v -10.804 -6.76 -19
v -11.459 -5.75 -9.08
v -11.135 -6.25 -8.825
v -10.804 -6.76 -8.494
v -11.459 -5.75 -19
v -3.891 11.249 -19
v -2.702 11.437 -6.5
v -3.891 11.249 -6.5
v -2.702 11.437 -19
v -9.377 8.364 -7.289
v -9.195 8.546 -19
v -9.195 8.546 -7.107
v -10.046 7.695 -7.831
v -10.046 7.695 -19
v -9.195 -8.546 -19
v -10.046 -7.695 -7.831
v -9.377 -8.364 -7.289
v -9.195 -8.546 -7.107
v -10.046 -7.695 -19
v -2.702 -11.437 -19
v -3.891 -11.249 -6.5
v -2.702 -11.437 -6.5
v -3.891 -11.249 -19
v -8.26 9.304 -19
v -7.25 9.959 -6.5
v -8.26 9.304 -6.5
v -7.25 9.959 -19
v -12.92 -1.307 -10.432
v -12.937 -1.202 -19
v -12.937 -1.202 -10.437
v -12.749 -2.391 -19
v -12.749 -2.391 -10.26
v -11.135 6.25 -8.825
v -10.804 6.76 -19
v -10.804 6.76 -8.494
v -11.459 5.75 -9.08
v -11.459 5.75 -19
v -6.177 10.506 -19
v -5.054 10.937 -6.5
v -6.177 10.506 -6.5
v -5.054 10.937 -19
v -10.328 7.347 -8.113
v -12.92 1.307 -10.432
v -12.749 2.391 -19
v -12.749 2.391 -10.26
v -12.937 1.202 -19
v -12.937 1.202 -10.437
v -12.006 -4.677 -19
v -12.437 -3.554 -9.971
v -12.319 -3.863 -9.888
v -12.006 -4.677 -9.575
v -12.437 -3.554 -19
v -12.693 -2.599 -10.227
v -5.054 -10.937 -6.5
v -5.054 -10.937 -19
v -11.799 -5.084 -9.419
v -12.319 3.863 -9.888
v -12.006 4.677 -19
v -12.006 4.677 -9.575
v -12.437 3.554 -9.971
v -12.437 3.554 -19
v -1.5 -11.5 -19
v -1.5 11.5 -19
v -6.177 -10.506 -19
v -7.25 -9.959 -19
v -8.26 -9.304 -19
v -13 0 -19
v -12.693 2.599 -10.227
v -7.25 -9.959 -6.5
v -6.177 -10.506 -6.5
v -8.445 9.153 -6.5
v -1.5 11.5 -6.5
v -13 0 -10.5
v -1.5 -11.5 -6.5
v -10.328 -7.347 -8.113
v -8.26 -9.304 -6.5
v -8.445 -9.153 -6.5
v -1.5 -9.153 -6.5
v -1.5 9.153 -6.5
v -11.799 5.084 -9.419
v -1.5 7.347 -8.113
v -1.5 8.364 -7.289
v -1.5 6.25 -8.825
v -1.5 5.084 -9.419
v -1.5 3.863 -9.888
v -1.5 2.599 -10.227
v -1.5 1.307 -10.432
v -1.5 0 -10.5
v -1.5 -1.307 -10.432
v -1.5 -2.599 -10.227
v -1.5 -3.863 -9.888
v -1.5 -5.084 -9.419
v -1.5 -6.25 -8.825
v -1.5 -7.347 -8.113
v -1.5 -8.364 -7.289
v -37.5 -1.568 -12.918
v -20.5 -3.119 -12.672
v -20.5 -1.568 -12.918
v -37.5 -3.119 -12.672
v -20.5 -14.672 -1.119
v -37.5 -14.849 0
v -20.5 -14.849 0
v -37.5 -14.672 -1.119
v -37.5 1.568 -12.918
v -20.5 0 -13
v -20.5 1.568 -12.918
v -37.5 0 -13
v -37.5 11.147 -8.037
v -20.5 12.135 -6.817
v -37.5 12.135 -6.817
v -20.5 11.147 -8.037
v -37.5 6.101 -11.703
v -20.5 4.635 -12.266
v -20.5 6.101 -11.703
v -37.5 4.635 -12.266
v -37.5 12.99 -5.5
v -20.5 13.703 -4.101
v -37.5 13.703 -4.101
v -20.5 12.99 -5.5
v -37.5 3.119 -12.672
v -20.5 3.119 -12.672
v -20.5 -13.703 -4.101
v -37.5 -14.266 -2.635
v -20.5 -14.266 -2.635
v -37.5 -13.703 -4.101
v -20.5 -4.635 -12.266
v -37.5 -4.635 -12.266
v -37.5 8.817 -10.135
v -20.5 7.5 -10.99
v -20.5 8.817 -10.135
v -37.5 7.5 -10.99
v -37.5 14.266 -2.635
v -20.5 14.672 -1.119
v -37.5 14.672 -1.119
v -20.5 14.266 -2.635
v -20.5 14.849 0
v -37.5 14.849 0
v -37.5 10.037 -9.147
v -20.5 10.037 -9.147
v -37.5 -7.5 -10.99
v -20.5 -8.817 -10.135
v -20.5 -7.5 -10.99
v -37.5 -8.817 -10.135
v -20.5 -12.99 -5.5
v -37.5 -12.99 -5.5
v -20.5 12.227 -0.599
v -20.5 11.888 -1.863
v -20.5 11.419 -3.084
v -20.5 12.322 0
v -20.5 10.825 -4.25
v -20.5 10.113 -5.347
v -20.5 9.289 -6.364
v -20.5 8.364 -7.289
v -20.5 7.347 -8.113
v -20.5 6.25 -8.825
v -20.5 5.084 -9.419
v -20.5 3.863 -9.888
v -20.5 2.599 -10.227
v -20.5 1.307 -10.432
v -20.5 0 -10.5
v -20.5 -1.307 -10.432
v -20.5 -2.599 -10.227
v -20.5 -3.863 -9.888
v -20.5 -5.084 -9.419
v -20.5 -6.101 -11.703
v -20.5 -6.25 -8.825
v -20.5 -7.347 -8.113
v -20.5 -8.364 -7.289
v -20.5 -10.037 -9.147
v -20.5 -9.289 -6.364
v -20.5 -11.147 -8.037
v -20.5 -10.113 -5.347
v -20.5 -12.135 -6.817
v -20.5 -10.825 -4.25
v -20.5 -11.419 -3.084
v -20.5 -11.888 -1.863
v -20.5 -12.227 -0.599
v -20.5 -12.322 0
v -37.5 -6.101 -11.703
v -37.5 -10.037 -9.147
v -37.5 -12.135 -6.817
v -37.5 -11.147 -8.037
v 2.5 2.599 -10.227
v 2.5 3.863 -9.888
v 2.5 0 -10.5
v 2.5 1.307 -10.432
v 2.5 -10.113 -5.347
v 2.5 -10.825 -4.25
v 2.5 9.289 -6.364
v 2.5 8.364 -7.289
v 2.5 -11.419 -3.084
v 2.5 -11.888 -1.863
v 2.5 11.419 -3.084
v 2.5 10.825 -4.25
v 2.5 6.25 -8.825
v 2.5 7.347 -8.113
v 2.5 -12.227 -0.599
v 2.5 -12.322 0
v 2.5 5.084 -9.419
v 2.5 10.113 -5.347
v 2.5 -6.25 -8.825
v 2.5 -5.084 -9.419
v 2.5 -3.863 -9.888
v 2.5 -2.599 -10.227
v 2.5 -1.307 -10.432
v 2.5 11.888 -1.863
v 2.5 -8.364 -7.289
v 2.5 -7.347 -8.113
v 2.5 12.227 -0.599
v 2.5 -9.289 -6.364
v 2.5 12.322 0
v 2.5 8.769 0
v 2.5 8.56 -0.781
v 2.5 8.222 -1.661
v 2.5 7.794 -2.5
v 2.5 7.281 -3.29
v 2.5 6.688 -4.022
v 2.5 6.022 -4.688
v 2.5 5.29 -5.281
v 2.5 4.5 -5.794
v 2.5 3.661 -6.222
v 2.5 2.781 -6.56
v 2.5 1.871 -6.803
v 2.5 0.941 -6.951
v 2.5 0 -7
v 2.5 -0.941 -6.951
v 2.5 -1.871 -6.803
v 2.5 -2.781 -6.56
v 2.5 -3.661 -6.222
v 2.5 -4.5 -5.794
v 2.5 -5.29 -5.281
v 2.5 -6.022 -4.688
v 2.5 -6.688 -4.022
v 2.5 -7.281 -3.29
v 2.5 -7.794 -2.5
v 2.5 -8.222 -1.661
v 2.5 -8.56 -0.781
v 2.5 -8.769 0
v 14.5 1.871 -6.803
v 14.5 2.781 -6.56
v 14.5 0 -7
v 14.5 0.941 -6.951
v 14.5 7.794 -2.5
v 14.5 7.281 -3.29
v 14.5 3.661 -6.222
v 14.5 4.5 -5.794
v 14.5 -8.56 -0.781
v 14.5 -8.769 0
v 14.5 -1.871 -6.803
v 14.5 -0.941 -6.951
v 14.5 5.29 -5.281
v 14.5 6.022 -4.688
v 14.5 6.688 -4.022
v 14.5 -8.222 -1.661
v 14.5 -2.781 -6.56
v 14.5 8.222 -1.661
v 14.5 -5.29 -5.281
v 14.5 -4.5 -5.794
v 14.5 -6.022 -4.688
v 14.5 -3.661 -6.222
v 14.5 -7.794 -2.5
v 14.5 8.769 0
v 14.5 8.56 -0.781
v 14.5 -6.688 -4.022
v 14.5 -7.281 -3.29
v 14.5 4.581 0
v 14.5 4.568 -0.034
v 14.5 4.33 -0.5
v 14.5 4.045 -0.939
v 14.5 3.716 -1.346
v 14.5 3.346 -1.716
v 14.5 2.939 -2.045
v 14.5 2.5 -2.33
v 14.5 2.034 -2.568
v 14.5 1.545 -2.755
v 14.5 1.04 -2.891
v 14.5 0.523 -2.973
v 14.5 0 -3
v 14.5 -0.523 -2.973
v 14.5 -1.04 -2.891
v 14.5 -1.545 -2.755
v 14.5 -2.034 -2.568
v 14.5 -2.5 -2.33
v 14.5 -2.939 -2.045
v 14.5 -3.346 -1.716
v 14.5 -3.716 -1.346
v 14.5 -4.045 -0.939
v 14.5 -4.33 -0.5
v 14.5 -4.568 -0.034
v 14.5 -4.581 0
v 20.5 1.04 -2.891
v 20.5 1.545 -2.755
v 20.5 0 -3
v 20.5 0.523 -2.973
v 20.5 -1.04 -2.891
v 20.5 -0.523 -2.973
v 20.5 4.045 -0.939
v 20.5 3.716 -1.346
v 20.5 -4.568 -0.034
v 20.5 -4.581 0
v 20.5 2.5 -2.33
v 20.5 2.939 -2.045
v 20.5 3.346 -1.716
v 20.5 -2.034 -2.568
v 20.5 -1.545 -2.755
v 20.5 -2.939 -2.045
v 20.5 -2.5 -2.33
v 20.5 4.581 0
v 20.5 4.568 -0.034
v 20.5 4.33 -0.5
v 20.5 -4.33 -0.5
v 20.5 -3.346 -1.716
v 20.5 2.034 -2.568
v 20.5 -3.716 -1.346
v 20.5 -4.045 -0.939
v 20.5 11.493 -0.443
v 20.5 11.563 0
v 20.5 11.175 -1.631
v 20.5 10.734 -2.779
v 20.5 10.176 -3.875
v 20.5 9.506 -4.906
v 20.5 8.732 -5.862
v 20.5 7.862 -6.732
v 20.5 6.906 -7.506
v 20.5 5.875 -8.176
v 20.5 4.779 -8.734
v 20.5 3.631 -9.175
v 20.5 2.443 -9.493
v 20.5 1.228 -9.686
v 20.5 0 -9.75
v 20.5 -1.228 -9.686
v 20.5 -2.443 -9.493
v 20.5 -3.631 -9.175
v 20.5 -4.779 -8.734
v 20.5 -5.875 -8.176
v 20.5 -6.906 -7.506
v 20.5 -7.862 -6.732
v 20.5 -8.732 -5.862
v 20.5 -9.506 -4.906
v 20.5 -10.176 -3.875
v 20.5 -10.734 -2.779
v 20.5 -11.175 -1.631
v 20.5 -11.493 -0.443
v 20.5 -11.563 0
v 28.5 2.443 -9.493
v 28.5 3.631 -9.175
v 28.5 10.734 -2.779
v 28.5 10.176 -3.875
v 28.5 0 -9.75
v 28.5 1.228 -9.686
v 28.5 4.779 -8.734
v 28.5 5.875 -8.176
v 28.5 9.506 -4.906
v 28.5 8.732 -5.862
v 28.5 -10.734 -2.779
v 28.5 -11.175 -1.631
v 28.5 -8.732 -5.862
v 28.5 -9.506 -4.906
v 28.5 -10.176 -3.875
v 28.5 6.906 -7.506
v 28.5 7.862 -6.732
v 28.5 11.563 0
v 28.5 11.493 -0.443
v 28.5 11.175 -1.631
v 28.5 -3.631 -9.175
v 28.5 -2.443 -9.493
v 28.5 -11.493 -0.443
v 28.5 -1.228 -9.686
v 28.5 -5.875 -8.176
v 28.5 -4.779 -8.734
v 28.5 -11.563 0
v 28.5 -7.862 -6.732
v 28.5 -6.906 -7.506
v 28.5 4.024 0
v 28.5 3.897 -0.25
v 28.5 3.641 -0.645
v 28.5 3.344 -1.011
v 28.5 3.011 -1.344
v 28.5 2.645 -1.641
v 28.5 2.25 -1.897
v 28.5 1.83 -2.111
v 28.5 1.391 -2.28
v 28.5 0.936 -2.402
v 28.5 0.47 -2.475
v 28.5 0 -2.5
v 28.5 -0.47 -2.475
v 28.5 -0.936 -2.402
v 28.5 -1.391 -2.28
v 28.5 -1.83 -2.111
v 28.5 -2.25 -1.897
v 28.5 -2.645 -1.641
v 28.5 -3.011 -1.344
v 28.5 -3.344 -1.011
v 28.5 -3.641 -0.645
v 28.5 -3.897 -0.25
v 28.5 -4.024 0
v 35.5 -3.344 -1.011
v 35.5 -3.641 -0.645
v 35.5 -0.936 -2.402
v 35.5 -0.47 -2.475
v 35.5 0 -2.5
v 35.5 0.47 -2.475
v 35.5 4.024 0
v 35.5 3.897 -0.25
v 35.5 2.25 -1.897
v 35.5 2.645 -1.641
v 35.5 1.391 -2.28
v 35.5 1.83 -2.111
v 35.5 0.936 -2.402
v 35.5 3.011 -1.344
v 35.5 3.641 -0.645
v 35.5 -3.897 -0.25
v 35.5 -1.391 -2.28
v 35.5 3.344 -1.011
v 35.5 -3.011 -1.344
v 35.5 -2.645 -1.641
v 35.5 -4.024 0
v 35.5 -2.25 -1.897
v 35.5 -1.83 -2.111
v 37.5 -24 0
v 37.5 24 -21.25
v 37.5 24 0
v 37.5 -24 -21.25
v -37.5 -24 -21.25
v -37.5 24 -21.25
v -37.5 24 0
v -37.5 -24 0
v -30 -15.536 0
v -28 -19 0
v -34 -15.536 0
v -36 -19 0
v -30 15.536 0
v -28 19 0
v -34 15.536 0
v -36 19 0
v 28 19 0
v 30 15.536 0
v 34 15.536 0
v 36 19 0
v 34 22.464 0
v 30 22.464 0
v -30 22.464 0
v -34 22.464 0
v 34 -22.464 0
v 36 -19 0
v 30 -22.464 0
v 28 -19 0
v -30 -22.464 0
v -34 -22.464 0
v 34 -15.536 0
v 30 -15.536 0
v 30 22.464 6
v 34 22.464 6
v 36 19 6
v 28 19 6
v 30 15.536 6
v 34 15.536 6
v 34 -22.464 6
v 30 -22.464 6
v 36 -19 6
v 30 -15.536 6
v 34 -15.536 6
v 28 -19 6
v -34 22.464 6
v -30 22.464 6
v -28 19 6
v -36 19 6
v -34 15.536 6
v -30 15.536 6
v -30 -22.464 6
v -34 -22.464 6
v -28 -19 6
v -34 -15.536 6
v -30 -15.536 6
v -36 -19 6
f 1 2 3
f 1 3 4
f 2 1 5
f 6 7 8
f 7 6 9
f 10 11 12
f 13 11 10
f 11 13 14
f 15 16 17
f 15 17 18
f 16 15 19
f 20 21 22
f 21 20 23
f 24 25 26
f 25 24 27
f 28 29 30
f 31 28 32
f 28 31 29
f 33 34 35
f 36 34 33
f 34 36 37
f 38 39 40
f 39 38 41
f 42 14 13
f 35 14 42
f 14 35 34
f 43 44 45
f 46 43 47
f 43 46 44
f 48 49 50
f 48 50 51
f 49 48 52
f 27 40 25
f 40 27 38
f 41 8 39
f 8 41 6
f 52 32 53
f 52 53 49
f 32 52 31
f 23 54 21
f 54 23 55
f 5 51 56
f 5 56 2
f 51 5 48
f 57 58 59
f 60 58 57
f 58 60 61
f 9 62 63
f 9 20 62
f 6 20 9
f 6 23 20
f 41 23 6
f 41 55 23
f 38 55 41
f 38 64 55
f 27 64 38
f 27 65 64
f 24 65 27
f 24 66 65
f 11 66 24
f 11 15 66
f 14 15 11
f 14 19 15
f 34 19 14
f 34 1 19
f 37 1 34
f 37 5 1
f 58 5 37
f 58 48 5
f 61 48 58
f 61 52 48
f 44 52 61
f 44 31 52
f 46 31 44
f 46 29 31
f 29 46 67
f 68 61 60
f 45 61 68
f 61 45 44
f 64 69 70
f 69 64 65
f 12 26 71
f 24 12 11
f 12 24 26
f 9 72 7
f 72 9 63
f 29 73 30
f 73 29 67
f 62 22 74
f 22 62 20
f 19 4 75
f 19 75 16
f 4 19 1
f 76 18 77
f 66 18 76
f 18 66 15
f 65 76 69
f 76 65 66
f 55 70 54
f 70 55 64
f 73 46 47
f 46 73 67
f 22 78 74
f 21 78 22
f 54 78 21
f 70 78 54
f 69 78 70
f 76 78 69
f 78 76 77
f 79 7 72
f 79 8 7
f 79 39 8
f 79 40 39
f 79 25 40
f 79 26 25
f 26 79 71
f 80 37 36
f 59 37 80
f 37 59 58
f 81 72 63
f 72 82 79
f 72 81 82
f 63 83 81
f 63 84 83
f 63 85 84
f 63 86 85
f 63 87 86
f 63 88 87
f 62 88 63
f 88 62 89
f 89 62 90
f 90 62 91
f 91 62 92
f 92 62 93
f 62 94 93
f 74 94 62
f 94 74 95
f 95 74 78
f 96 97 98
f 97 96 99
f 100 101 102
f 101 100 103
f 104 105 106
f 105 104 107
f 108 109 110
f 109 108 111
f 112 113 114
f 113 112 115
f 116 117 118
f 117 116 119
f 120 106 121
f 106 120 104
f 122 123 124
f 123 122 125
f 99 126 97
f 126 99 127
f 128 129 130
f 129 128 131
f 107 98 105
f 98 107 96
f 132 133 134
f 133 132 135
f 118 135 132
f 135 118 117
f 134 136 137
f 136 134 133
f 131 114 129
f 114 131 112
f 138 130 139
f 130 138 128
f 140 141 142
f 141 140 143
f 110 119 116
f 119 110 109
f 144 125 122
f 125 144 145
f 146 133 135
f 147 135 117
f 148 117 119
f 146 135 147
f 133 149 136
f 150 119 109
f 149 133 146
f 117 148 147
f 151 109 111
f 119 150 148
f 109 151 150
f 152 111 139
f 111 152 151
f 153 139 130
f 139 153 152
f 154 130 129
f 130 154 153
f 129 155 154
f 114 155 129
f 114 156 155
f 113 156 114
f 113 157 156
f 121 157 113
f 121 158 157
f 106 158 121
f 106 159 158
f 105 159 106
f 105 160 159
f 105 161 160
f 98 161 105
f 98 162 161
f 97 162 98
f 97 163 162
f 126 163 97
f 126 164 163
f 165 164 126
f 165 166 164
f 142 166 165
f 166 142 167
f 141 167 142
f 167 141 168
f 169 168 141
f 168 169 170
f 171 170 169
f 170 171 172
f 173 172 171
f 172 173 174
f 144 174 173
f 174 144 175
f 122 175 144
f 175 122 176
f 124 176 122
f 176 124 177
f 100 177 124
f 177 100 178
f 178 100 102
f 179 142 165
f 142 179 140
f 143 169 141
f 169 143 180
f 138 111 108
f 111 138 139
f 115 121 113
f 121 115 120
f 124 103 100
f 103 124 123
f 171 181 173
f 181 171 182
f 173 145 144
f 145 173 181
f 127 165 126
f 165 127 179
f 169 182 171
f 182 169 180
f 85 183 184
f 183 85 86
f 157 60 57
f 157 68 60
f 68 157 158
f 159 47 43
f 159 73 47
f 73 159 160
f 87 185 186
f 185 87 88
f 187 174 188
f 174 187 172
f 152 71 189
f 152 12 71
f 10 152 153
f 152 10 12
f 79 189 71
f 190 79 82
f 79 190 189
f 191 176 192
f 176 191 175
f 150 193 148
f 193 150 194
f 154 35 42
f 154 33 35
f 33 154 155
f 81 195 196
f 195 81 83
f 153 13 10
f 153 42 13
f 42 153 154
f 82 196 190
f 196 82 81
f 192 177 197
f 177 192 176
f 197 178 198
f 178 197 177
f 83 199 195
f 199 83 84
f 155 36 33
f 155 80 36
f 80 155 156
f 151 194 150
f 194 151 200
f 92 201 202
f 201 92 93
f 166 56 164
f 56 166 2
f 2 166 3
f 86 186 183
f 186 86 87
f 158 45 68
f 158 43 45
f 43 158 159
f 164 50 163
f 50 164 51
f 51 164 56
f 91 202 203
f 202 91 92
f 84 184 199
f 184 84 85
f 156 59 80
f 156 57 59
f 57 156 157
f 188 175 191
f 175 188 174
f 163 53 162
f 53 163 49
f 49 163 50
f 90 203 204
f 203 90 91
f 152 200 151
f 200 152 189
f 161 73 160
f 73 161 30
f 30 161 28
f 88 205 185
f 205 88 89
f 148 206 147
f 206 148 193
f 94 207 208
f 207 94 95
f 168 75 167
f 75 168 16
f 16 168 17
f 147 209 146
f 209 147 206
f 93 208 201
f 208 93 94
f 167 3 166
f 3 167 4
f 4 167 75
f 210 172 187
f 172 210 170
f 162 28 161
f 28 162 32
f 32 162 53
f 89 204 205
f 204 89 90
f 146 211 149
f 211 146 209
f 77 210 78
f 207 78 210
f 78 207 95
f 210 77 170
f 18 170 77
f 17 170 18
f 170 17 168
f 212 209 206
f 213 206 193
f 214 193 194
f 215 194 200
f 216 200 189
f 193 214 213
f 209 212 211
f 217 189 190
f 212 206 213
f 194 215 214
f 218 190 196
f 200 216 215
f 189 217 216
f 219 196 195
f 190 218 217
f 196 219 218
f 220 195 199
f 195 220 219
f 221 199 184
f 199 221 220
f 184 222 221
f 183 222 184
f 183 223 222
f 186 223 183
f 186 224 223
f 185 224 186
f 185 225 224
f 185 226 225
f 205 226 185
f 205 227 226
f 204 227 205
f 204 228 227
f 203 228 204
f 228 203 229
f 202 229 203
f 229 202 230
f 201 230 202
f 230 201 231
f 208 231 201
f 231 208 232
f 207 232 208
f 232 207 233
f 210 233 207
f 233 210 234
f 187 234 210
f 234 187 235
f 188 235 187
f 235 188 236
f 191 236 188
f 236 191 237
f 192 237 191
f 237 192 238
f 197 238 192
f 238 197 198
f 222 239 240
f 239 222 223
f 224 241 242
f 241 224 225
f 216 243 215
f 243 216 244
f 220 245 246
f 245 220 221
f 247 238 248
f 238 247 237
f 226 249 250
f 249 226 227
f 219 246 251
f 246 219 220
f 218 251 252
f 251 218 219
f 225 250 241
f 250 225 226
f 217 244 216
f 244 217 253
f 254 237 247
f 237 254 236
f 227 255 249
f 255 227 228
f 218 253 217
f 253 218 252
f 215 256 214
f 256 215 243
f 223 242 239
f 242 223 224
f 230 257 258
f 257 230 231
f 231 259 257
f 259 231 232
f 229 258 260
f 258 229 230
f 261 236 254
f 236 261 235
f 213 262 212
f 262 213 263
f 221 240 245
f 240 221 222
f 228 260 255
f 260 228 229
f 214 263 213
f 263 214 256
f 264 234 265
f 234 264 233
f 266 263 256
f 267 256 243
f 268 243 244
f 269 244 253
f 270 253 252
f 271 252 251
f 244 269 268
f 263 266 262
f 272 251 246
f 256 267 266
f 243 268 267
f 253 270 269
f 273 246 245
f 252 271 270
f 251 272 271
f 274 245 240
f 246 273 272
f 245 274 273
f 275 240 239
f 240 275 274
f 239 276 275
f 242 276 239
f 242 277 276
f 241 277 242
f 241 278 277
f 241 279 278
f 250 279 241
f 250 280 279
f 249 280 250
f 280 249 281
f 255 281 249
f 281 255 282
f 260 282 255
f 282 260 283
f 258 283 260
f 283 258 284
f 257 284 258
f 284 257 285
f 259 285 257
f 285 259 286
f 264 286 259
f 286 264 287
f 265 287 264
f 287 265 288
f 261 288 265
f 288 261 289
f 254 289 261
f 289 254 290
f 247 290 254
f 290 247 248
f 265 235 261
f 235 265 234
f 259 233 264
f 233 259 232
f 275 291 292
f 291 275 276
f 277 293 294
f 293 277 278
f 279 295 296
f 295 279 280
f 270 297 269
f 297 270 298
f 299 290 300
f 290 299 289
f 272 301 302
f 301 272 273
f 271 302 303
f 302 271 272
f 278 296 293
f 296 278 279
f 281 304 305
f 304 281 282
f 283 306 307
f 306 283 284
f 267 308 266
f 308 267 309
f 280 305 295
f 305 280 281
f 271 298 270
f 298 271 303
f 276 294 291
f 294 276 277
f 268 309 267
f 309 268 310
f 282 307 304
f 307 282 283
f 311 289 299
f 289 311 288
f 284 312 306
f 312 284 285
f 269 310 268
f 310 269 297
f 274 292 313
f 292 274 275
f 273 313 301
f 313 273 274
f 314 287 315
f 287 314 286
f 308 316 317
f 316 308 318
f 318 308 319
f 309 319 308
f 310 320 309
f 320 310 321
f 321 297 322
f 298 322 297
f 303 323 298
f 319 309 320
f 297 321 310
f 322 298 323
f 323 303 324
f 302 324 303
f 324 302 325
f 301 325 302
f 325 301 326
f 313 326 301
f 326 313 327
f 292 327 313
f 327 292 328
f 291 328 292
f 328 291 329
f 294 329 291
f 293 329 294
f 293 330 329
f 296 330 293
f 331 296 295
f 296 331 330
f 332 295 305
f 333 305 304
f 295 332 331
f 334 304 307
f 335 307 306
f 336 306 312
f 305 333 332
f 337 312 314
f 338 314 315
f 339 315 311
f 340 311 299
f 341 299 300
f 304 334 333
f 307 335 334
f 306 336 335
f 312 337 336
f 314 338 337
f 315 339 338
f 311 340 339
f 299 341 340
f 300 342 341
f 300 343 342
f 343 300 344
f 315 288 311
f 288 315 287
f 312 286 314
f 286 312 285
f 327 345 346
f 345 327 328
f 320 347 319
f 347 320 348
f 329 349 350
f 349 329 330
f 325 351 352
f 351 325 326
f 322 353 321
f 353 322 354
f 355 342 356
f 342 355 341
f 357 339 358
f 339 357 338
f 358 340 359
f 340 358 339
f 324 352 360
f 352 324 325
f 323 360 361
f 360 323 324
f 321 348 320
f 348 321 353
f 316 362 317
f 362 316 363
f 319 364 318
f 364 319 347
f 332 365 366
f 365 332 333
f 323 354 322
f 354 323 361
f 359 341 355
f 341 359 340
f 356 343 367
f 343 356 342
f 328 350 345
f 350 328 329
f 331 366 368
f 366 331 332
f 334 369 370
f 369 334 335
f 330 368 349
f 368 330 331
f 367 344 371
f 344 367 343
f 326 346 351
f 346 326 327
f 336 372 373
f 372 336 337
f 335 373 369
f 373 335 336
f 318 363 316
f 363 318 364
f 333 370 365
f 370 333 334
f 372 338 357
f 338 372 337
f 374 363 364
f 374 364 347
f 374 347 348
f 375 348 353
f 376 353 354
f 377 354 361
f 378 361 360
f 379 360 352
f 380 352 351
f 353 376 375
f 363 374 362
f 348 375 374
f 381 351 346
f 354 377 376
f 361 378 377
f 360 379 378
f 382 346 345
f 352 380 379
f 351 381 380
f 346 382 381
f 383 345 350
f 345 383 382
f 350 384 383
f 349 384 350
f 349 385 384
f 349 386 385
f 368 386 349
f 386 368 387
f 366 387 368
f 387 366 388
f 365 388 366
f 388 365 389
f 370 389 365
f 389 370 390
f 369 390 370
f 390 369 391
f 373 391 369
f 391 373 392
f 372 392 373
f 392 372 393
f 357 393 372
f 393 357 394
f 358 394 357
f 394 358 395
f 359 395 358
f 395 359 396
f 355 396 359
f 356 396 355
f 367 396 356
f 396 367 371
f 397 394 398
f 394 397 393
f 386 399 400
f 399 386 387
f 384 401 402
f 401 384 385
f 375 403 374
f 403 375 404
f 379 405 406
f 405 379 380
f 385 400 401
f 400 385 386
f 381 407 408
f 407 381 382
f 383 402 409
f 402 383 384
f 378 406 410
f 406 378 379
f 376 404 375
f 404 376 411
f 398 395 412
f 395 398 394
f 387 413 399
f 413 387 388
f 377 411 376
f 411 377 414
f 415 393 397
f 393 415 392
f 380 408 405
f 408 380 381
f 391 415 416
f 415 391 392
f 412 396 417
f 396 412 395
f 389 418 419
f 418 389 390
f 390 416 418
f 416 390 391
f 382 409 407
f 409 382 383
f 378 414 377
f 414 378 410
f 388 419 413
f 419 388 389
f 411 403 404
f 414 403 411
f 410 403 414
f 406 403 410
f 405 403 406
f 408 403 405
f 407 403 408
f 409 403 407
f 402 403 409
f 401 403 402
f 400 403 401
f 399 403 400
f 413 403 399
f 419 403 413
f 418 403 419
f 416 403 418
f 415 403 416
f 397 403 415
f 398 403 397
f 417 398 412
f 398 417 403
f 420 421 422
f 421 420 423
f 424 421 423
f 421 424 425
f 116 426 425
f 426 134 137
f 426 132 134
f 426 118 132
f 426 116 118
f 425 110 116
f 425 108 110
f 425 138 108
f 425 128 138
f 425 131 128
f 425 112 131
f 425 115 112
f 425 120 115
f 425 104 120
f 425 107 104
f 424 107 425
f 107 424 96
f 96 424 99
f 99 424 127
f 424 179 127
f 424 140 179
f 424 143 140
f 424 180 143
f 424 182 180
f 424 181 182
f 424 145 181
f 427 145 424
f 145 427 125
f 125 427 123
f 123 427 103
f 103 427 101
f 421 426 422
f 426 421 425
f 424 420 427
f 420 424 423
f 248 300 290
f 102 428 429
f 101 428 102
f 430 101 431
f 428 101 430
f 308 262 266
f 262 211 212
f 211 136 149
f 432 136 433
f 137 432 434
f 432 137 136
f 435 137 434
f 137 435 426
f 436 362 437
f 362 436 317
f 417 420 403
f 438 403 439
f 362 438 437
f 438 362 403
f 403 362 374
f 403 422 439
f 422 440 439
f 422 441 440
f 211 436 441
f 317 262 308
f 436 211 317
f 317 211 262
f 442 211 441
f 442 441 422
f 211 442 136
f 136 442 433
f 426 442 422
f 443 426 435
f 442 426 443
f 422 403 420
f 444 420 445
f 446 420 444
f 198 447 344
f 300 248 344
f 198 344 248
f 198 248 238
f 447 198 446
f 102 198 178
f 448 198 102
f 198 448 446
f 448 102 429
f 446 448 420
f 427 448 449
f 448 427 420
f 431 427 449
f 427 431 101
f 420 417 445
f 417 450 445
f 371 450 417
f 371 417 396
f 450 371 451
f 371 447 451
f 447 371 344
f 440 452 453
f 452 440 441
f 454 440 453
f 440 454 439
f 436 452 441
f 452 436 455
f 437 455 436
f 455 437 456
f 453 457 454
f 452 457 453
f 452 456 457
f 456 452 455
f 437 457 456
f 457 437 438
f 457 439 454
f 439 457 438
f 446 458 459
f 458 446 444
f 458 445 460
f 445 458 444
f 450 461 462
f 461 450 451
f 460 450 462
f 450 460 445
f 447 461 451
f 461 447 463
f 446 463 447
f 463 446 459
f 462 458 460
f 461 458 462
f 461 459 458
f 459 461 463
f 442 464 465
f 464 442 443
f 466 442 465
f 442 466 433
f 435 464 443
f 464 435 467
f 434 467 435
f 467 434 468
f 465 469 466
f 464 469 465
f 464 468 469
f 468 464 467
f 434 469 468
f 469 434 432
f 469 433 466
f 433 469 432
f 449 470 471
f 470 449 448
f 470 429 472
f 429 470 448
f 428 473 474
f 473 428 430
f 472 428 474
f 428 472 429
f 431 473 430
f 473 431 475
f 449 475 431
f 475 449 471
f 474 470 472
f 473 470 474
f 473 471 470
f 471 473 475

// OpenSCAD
// file: Hex.scad
/** Created by Jose Araujo. 2014-6-7.

    Just standard hex key (parametric) with no handle; 
*/


module Hex(
				radius // radius in mm
				, h // height of hex
		 ){
cylinder ( r= radius, h =h, $fn = 6 ) ;
}

//Hex(radius = 5,h  = 25);

//cylinder ( r = 6.7/2, h=5, $fn= 50);
//Hex(radius = 6.7*.95/2, h = 5);
Hex(radius = 6.7*.85/2, h = 5);

translate([0,1.9,-5/2])
difference (){
cube ( size =[8.5, 8.5,6], center = true);
translate ([0,0,-1])
cylinder(r=6.7/sqrt(3),h=5,center=true,$fn=6);
}
// main file
// JoseA. 2014-06-21
// This is a simple case for storing an small 
// portable camera tripod.

use <Hex.scad>

// tripod shape
module tripod(){

rotate( [0,90,0])
cylinder( r=15/*6*/, h = 67 ) ;

translate ( [67,0,0])
rotate( [0,90,0])
cylinder ( r= 25/2, h = 23 );

translate ( [86, 0,-25/2 - 8.5])
difference (){
cylinder( r= 23/2, h = 12.5);

translate ([0,-23/2,0])
cube ( [23, 23,12.5]);
}


translate ( [67+23,0,0])
rotate( [0,90,0])
cylinder ( r= 18/2, h =12);

translate ( [67+23+12,0,0])
rotate( [0,90,0])
cylinder ( r = 5, h= 6 );

translate ( [67+23+12+6,0,0])
rotate( [0,90,0])
cylinder ( r = 23.5/2, h= 8 );


translate ( [67+23+12+6+8,0,0])
rotate( [0,90,0])
cylinder ( r = 9/2, h= 7 );

}

module full_enclosure(){
translate ([-(67+23+12+6+8+7+2)+75/2,0,2])
difference()
{
translate ( [(67+23+12+6+8+7)- 75/2 +2,0,-2])
cube ( [75,15*2+18,  15*2+8.5+4], center =  true) ;
{
// top-middle box, so the piece can be inserted.
//translate ( [(67+23+12+6+8+7)/2,0,18/2])
//cube ( [67+23+12+6+8+7,15*2,  18], center =  true) ;
tripod();
}
}
}

//full_enclosure();

$fn = 60;

translate ( [32,19,0])Hex(4,6 );
translate ( [32,-19,0])Hex(4,6 );
translate ( [-32,19,0])Hex(4,6);
translate ( [-32,-19,0])Hex(4,6 );
intersection(){
translate ([0,0, -(15*2+8.5+4)/4 ])
cube ( [75, 15*2+18, (15*2+8.5+4)/2],center = true);
full_enclosure();
}

/*
translate ( [0, 65,0])
//rotate ( [180,0,0])
{
difference (){
intersection(){
translate ([0,0, -(15*2+8.5+4)/4 ])
cube ( [75, 15*2+18, (15*2+8.5+4)/2],center = true);
rotate ([180,0,0])
full_enclosure();
}
translate ( [32,19,-6+.25])Hex(4+.25,6+.25 );
translate ( [32,-19,-6+.25])Hex(4+.25,6+.25 );
translate ( [-32,19,-6+.25])Hex(4+.25,6+.25);
translate ( [-32,-19,-6+.25])Hex(4+.25,6+.25 );
}
}
*/
